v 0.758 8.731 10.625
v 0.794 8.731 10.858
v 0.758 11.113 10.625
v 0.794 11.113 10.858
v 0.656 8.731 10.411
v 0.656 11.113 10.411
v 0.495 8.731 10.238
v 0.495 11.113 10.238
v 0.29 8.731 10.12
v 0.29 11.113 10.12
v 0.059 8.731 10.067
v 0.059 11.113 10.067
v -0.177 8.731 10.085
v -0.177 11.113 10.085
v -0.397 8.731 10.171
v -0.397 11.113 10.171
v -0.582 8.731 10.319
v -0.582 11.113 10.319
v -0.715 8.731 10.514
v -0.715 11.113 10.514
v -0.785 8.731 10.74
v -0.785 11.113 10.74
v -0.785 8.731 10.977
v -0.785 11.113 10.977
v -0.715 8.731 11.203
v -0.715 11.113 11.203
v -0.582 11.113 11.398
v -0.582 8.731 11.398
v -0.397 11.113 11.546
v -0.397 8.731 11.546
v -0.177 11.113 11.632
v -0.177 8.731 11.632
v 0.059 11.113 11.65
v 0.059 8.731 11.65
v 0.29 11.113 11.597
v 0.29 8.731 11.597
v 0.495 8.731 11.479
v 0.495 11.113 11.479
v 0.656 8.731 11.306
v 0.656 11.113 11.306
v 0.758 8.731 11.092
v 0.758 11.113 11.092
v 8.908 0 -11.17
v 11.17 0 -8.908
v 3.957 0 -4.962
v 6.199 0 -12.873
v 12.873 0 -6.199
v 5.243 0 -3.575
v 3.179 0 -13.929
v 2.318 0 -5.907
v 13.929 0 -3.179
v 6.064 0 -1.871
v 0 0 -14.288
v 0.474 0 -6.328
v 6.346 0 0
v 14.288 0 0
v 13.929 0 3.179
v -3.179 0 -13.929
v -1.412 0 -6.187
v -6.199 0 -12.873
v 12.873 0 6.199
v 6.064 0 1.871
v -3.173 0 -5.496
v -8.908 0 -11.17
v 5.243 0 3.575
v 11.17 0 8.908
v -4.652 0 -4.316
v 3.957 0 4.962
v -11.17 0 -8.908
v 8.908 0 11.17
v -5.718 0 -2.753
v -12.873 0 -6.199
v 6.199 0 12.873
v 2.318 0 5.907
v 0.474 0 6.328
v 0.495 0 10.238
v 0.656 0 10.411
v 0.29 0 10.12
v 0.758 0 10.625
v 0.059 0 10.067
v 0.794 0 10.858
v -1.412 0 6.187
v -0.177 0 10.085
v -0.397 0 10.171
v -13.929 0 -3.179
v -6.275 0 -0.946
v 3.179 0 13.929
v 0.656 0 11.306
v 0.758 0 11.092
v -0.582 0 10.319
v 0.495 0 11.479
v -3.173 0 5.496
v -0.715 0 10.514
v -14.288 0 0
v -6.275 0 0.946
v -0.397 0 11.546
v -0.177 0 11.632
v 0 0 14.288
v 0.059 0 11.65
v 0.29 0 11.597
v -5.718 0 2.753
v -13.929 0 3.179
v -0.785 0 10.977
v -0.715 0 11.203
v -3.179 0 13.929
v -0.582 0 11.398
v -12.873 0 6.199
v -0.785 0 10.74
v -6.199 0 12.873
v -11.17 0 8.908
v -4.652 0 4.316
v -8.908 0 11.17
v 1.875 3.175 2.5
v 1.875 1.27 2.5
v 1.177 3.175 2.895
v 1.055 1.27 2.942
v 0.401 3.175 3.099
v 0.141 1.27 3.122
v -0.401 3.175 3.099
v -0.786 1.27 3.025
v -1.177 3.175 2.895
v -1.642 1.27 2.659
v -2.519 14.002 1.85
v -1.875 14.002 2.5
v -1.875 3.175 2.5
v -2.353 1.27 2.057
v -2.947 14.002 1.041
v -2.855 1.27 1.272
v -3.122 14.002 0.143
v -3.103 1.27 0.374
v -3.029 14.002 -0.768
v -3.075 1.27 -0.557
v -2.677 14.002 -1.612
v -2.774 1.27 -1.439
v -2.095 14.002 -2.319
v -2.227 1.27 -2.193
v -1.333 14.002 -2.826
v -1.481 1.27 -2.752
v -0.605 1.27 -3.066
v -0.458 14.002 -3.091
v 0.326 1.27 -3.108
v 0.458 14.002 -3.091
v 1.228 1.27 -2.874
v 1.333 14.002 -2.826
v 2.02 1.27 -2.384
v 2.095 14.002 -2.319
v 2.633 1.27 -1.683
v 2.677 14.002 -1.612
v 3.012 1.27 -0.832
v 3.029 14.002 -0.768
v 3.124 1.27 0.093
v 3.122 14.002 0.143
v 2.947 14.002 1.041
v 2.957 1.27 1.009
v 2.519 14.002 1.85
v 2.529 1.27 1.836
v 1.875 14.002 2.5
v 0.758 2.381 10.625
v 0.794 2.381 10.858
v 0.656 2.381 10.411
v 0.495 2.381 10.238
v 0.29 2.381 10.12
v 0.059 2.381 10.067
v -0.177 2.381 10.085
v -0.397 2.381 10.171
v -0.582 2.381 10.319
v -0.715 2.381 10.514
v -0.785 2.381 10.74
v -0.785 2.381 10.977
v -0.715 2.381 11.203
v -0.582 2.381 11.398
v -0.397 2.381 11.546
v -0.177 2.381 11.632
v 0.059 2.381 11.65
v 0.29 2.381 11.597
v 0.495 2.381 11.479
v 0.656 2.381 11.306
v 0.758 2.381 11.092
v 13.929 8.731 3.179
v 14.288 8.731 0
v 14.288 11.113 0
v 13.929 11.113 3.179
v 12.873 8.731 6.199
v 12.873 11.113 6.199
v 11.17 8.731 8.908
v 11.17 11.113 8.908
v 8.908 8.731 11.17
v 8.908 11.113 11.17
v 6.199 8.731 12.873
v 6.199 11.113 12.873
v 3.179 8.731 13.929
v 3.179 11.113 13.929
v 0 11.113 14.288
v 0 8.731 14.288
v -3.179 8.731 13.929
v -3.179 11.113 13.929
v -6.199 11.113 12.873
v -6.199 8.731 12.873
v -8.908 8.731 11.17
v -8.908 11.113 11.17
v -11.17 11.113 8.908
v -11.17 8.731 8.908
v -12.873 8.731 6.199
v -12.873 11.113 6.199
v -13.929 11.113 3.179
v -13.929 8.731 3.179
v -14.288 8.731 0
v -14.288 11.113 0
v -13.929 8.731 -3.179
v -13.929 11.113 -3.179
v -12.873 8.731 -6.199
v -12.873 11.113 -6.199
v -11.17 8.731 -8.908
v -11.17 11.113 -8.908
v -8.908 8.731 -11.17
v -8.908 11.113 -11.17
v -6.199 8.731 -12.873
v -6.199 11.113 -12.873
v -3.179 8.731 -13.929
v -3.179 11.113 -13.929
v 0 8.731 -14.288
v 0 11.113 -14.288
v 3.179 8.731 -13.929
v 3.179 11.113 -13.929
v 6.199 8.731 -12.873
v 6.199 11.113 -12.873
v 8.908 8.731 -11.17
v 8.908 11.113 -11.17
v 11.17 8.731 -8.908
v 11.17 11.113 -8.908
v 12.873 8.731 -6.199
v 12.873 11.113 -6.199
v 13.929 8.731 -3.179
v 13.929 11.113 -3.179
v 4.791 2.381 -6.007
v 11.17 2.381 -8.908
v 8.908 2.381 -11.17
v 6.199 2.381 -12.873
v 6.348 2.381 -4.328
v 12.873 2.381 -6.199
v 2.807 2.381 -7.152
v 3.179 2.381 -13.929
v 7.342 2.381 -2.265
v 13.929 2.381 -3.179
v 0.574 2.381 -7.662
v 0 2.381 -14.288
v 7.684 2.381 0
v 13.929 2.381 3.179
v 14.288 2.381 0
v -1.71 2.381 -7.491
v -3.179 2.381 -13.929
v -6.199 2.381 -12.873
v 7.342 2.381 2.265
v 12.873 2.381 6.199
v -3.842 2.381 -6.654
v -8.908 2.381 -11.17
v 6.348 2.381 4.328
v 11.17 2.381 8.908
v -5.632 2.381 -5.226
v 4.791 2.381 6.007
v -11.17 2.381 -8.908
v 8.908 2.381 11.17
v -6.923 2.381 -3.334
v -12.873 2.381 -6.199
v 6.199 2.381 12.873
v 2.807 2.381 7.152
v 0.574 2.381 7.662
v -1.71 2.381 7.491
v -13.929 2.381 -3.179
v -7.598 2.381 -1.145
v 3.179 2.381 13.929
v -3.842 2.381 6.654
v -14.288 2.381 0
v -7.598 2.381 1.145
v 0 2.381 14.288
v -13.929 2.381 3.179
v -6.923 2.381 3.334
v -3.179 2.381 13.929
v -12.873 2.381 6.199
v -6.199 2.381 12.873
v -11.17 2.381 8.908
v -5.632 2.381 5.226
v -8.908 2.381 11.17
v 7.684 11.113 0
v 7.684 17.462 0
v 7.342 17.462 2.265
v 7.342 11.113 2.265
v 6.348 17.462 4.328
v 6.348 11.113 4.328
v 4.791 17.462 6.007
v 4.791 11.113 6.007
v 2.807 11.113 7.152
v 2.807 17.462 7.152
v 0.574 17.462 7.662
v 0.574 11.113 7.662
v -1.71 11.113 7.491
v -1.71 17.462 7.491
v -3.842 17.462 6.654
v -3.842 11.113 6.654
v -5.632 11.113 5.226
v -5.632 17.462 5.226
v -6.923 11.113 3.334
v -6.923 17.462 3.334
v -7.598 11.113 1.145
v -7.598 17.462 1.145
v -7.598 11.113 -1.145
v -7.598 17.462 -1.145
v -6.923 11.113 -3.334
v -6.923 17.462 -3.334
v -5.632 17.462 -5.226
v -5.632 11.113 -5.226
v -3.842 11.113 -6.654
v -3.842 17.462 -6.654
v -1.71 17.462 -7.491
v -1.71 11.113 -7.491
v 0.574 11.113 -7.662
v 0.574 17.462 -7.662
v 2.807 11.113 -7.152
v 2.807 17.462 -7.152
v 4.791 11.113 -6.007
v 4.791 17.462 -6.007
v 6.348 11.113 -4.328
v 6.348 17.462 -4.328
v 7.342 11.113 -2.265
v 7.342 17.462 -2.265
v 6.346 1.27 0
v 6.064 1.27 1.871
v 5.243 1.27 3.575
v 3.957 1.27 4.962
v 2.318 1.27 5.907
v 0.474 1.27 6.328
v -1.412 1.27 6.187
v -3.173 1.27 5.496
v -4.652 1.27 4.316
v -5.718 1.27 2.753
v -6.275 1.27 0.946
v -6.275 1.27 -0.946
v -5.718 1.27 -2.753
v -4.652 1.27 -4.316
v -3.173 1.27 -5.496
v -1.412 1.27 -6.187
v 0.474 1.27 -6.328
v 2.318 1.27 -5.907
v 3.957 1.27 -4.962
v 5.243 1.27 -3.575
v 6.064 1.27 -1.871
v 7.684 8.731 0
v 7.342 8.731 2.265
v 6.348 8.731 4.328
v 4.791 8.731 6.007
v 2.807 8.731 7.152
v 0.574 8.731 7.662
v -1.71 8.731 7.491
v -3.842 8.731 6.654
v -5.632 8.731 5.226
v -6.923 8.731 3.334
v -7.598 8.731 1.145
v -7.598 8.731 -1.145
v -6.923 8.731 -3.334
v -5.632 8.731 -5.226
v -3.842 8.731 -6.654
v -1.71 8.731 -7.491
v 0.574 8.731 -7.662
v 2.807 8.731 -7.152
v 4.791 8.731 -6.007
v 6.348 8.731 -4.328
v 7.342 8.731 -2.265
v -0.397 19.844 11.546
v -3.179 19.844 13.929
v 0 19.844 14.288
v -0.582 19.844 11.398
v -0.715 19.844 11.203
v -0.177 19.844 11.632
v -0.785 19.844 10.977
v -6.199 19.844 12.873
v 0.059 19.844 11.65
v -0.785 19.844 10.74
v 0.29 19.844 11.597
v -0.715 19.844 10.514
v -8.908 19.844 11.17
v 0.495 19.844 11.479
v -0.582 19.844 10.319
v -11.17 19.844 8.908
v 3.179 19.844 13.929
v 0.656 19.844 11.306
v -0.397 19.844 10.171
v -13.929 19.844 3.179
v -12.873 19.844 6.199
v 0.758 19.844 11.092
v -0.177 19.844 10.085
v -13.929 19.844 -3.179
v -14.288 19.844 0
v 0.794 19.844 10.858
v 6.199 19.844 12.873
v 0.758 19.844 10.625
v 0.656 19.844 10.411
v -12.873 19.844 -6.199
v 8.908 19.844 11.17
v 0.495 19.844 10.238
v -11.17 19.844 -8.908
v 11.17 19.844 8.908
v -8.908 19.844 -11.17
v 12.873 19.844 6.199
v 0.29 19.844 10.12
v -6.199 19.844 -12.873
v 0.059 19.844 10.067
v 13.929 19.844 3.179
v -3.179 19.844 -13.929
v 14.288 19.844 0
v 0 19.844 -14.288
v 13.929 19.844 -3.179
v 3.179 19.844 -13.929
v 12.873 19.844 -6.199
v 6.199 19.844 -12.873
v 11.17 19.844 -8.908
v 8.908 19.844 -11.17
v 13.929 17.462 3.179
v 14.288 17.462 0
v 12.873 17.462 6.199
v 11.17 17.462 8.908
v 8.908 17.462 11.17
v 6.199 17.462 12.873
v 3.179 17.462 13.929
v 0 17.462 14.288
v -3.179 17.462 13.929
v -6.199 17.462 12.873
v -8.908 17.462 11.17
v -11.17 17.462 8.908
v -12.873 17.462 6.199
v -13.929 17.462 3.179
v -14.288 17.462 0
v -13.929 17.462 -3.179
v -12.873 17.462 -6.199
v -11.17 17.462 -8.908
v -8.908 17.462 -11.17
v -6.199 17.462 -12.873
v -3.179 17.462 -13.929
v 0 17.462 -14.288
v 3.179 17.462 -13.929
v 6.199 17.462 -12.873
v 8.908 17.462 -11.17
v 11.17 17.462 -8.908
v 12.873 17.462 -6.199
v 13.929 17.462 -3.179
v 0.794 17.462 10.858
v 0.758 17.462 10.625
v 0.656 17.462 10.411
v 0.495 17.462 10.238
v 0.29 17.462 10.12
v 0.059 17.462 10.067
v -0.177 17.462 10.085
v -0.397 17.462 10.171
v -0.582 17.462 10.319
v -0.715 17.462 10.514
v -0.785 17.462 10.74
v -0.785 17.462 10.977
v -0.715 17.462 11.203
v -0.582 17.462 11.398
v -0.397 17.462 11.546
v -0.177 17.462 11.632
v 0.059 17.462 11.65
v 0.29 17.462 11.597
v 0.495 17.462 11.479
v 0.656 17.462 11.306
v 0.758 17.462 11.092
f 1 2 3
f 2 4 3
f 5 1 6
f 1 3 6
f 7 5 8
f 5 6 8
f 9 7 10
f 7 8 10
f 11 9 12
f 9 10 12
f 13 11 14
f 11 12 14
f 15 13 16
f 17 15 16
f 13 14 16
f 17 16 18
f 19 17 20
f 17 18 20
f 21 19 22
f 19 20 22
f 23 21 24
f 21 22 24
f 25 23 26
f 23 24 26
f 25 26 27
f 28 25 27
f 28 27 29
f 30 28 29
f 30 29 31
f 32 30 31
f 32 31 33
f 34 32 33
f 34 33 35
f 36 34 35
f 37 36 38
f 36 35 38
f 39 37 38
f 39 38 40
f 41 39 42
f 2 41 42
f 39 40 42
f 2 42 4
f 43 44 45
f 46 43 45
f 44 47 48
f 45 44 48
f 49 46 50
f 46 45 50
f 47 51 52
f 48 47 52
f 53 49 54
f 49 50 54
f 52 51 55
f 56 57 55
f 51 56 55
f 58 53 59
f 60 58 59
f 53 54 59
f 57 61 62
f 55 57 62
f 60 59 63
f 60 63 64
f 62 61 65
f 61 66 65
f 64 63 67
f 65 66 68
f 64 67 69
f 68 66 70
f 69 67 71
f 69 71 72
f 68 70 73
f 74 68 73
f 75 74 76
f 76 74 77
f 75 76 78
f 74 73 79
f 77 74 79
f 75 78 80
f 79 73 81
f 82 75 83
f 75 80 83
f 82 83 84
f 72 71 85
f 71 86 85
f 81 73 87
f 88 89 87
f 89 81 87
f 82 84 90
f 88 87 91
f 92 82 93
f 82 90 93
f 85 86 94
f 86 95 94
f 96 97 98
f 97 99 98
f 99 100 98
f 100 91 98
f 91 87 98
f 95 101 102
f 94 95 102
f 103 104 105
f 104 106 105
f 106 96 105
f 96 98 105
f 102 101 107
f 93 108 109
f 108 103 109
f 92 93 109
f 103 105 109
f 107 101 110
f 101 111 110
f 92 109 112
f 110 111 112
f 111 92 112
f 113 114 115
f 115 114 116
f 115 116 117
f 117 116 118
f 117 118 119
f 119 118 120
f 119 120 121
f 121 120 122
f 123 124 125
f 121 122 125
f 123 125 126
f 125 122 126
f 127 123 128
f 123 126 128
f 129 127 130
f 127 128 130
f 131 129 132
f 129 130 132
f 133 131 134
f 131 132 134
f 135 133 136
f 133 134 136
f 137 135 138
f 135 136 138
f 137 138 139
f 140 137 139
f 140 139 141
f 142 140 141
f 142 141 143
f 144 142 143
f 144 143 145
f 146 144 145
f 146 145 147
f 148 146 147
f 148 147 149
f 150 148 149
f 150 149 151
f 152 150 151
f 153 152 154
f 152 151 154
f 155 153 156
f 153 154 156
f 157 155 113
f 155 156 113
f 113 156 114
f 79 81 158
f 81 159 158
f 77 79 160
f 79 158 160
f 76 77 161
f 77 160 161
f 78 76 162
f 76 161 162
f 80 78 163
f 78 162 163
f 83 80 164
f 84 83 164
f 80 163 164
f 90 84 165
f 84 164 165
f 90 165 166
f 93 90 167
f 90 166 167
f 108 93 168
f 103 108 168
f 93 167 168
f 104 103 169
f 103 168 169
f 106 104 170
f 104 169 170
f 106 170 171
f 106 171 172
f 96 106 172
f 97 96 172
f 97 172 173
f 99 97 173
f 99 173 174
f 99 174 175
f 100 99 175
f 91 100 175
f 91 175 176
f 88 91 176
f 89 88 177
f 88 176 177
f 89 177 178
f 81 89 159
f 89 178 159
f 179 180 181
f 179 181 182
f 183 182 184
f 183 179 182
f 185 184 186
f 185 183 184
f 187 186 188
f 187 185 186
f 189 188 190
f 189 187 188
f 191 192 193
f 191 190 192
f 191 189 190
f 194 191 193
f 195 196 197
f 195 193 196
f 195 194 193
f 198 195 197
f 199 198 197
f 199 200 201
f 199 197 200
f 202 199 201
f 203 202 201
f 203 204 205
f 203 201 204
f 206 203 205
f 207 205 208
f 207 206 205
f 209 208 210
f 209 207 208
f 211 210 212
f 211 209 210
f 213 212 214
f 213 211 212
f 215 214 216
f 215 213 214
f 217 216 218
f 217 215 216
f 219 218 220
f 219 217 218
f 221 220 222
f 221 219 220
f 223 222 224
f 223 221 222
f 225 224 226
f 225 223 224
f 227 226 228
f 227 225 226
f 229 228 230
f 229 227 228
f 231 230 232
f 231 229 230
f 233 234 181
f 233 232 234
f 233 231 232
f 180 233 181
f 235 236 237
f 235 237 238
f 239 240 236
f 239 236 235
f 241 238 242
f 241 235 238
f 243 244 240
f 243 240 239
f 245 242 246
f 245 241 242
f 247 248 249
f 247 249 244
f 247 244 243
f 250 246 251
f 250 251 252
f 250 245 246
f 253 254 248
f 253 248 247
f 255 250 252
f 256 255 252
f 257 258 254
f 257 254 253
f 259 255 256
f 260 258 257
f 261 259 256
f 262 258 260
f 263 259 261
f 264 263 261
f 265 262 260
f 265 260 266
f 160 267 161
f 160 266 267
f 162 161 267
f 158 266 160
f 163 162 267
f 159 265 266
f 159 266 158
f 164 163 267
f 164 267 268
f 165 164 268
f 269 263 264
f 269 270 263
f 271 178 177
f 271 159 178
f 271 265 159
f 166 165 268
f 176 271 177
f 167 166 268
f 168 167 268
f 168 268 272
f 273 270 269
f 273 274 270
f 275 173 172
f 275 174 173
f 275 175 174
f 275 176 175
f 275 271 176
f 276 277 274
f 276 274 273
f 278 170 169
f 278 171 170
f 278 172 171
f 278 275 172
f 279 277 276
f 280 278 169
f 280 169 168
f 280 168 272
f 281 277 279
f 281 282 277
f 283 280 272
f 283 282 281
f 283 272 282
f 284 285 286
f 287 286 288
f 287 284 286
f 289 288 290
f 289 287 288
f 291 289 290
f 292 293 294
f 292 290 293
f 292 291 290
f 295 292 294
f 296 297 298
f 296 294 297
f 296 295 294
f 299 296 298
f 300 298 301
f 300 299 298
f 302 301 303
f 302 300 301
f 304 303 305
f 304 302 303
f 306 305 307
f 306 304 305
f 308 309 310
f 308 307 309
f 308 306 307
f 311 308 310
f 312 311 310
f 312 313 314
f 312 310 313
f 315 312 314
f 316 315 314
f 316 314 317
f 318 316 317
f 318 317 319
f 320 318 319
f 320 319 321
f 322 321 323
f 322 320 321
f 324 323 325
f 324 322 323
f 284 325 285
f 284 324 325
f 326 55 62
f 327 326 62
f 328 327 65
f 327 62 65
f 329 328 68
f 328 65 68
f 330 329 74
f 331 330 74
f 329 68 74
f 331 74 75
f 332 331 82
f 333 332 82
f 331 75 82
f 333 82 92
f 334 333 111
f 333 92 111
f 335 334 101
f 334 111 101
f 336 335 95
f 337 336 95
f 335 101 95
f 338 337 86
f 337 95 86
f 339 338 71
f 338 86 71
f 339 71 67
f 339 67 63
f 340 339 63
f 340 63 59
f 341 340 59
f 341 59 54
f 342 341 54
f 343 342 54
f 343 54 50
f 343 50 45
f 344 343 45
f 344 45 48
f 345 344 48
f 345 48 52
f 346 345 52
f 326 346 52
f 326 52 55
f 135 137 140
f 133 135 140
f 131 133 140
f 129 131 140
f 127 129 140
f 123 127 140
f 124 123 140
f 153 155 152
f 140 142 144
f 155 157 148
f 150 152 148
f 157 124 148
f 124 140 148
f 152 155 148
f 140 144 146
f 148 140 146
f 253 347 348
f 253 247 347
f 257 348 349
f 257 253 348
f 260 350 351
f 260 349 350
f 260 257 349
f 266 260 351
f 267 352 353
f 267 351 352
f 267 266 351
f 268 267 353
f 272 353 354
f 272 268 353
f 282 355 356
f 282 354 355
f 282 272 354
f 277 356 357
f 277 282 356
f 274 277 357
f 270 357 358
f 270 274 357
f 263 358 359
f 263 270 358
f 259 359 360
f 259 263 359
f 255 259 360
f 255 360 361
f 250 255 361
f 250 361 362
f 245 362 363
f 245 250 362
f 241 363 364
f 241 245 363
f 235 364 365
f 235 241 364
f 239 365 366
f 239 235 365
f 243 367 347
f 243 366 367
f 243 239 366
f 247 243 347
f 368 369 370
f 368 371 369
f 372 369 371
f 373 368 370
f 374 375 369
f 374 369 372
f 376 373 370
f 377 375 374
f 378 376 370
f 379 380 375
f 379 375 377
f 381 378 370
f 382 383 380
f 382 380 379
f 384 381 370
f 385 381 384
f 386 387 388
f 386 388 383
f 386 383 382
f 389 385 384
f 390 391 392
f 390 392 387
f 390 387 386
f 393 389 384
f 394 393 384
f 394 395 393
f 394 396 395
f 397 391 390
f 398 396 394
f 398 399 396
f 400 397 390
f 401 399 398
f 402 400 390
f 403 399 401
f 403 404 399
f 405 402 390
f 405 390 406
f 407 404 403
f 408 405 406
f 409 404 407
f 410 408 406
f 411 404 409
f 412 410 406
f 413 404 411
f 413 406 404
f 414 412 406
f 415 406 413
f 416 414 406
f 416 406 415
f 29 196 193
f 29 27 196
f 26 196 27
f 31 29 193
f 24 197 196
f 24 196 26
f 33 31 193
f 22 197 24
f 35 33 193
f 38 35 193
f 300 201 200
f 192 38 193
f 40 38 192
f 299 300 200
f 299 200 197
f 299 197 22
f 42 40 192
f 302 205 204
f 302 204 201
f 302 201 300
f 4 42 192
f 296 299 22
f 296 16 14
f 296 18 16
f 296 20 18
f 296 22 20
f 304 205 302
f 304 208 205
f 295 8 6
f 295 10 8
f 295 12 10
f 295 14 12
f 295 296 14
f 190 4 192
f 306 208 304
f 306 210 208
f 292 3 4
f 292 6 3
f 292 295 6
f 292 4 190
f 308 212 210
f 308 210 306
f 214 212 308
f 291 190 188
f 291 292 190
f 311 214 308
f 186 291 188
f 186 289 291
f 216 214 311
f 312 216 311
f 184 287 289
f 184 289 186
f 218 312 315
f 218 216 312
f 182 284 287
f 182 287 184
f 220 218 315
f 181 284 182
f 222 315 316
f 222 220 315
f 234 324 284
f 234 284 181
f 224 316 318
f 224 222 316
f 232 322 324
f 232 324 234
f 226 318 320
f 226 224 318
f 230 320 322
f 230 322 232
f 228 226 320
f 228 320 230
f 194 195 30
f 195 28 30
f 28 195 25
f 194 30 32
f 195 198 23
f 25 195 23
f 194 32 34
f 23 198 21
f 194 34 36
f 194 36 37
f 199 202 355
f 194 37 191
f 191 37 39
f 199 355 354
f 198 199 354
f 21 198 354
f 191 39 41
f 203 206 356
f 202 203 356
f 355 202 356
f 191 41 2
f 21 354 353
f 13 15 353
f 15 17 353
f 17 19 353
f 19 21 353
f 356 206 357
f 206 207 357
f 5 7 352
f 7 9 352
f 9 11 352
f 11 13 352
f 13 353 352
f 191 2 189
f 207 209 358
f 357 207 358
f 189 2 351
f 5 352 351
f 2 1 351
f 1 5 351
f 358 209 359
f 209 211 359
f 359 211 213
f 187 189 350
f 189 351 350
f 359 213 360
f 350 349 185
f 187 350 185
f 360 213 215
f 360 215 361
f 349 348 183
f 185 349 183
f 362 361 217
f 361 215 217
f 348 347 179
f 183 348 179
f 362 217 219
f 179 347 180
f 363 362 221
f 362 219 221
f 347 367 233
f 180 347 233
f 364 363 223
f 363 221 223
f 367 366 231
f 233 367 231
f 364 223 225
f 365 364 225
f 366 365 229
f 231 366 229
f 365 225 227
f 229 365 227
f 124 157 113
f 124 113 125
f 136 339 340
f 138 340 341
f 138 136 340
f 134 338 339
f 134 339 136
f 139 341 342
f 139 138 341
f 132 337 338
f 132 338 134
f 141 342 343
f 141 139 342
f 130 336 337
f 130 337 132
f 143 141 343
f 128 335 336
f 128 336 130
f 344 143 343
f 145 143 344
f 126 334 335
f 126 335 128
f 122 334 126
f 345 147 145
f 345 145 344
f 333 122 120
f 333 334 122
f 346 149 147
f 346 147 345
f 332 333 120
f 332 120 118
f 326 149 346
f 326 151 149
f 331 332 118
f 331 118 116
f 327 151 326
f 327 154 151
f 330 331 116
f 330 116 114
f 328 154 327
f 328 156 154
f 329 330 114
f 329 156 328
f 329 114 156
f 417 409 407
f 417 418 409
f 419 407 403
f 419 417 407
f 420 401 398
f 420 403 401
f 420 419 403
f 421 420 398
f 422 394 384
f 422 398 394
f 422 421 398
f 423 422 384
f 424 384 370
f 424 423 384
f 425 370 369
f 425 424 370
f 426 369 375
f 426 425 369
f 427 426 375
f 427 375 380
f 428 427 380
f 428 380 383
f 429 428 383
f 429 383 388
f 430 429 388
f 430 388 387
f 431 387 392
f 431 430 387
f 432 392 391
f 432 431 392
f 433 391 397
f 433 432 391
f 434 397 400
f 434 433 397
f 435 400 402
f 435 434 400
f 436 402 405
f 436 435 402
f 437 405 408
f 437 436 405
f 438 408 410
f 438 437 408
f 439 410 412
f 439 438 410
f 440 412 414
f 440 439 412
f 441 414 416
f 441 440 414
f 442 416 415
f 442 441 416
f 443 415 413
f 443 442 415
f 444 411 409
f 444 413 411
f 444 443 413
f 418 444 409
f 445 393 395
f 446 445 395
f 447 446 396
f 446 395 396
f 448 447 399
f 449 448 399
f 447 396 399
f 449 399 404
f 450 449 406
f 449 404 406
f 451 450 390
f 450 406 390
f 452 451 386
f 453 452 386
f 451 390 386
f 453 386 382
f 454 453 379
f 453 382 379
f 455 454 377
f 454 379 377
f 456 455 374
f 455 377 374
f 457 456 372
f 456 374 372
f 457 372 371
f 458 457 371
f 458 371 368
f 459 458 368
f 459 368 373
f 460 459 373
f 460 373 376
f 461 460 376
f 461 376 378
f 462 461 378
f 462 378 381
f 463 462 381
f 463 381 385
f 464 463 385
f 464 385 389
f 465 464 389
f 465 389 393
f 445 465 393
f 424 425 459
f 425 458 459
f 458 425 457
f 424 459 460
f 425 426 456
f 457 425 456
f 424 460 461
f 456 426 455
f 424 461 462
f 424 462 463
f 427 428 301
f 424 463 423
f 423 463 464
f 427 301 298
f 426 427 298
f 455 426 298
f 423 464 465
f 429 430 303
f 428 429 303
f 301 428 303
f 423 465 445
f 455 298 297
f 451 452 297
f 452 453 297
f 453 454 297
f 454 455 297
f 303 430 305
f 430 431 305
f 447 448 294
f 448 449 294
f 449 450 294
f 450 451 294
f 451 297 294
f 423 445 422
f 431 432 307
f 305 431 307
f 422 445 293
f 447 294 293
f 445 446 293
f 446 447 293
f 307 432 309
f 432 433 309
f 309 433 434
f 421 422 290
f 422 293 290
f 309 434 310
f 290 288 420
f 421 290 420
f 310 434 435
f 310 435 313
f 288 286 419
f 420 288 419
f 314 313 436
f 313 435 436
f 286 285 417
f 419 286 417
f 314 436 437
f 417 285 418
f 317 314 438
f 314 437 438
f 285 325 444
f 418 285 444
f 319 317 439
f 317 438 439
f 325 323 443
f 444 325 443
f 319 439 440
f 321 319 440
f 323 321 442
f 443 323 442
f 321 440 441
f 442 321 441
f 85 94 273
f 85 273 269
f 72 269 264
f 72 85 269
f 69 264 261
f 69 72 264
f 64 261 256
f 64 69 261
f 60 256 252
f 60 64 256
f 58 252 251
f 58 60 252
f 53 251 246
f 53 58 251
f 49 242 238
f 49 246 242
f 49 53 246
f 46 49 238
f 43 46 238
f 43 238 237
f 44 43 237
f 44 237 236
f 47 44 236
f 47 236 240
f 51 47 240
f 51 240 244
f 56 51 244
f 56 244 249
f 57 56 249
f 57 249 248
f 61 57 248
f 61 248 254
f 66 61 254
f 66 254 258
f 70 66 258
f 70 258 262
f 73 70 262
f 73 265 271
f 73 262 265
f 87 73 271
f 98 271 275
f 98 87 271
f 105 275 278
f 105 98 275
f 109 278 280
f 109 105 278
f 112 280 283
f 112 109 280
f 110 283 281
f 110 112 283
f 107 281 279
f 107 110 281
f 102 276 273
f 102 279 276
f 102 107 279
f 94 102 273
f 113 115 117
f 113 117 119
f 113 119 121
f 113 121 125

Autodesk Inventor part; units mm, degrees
ref_plane "YZ Plane" through (0, 0, 0) normal (1, 0, 0) x (0, 1, 0)
ref_plane "XZ Plane" through (0, 0, 0) normal (0, 1, 0) x (-1, 0, 0)
ref_plane "XY Plane" through (0, 0, 0) normal (0, 0, 1) x (1, 0, 0)
sketch "Sketch1" plane through (0, 0, 0) normal (0, 1, 0) x (-1, 0, 0)
  circle A0 centre (0, 0) radius 14.2875
  dimension "d0" = 28.575
extrude "Extrusion1" add sketch "Sketch1" along normal blind 2.3813
sketch "Sketch2" plane through (0, 2.3813, 0) normal (0, 1, 0) x (1, 0, 0)
  circle A0 centre (0, 0) radius 6.096 construction
  circle A1 centre (0, 0) radius 7.6835
  dimension "d6" = 12.192
  dimension "d7" = 1.5875
extrude "Extrusion2" add sketch "Sketch2" along normal blind 6.35
sketch "Sketch3" plane through (0, 8.7313, 0) normal (0, 1, 0) x (1, 0, 0)
  circle A0 centre (0, 0) radius 14.2875
  circle A1 centre (0, 0) radius 14.2875 projected
extrude "Extrusion3" add sketch "Sketch3" along normal blind 2.3813
sketch "Sketch4" plane through (0, 11.1125, 0) normal (0, 1, 0) x (1, 0, 0)
  circle A0 centre (0, 0) radius 7.6835 projected
  circle A1 centre (0, 0) radius 7.6835
extrude "Extrusion4" add sketch "Sketch4" along normal blind 6.35
sketch "Sketch5" plane through (0, 17.4625, 0) normal (0, 1, 0) x (1, 0, 0)
  circle A0 centre (0, 0) radius 14.2875
  circle A1 centre (0, 0) radius 14.2875 projected
extrude "Extrusion5" add sketch "Sketch5" along normal blind 2.3813
sketch "Sketch6" plane through (0, 0, 0) normal (0, -1, 0) x (1, 0, 0)
  circle A0 centre (0, 0) radius 3.125
  line L0 (1.875, 2.5) -> (-1.875, 2.5)
  dimension "d16" = 6.25
  dimension "d35" = 2.5
extrude "Extrusion6" cut sketch "Sketch6" against normal through all contours A0 L0 picked at (0.5554, 0.5311)
sketch "Sketch7" plane through (0, 0, 0) normal (0, -1, 0) x (1, 0, 0)
  circle A0 centre (0, 0) radius 6.346
  dimension "d20" = 12.692
extrude "Extrusion7" cut sketch "Sketch7" against normal blind 1.27
sketch "Sketch8" plane through (0, 0, 0) normal (0, -1, 0) x (1, 0, 0)
  circle A0 centre (0, 0) radius 3.125
  arc A1 (-1.875, 2.5) -> (1.875, 2.5) centre (0, 0) ccw projected
extrude "Extrusion8" cut sketch "Sketch8" against normal blind 3.175
sketch "Sketch9" plane through (0, 19.8438, 0) normal (0, 1, 0) x (1, 0, 0)
  circle A0 centre (0, 0) radius 7.6835 projected
  circle A1 centre (0, -10.8585) radius 0.7937
  point P0 (0, -7.6835)
  dimension "d31" = 1.5875
  dimension "d32" = 3.175
extrude "Extrusion9" cut sketch "Sketch9" against normal through all contours A1
sketch "Sketch10" plane through (0, 19.8438, 0) normal (0, 1, 0) x (1, 0, 0)
  circle A0 centre (0, -10.8585) radius 0.7937 projected
  line L0 (1.875, -2.5) -> (-1.875, -2.5) projected
  arc A1 (1.875, -2.5) -> (-1.875, -2.5) centre (0, 0) ccw projected
  circle A2 centre (0, 0) radius 14.2875 projected
extrude "Extrusion10" add sketch "Sketch10" against normal blind 5.842 contours L0 A1
equation "\"d10\" = d1"
equation "\"d12\" = d8"
equation "\"d14\" = d1"
equation "\"d18\" = d1"
equation "\"d1\" = 2.38125"
equation "\"d8\" = 6.35"
properties part number "PulleyV2_3DPrint"
